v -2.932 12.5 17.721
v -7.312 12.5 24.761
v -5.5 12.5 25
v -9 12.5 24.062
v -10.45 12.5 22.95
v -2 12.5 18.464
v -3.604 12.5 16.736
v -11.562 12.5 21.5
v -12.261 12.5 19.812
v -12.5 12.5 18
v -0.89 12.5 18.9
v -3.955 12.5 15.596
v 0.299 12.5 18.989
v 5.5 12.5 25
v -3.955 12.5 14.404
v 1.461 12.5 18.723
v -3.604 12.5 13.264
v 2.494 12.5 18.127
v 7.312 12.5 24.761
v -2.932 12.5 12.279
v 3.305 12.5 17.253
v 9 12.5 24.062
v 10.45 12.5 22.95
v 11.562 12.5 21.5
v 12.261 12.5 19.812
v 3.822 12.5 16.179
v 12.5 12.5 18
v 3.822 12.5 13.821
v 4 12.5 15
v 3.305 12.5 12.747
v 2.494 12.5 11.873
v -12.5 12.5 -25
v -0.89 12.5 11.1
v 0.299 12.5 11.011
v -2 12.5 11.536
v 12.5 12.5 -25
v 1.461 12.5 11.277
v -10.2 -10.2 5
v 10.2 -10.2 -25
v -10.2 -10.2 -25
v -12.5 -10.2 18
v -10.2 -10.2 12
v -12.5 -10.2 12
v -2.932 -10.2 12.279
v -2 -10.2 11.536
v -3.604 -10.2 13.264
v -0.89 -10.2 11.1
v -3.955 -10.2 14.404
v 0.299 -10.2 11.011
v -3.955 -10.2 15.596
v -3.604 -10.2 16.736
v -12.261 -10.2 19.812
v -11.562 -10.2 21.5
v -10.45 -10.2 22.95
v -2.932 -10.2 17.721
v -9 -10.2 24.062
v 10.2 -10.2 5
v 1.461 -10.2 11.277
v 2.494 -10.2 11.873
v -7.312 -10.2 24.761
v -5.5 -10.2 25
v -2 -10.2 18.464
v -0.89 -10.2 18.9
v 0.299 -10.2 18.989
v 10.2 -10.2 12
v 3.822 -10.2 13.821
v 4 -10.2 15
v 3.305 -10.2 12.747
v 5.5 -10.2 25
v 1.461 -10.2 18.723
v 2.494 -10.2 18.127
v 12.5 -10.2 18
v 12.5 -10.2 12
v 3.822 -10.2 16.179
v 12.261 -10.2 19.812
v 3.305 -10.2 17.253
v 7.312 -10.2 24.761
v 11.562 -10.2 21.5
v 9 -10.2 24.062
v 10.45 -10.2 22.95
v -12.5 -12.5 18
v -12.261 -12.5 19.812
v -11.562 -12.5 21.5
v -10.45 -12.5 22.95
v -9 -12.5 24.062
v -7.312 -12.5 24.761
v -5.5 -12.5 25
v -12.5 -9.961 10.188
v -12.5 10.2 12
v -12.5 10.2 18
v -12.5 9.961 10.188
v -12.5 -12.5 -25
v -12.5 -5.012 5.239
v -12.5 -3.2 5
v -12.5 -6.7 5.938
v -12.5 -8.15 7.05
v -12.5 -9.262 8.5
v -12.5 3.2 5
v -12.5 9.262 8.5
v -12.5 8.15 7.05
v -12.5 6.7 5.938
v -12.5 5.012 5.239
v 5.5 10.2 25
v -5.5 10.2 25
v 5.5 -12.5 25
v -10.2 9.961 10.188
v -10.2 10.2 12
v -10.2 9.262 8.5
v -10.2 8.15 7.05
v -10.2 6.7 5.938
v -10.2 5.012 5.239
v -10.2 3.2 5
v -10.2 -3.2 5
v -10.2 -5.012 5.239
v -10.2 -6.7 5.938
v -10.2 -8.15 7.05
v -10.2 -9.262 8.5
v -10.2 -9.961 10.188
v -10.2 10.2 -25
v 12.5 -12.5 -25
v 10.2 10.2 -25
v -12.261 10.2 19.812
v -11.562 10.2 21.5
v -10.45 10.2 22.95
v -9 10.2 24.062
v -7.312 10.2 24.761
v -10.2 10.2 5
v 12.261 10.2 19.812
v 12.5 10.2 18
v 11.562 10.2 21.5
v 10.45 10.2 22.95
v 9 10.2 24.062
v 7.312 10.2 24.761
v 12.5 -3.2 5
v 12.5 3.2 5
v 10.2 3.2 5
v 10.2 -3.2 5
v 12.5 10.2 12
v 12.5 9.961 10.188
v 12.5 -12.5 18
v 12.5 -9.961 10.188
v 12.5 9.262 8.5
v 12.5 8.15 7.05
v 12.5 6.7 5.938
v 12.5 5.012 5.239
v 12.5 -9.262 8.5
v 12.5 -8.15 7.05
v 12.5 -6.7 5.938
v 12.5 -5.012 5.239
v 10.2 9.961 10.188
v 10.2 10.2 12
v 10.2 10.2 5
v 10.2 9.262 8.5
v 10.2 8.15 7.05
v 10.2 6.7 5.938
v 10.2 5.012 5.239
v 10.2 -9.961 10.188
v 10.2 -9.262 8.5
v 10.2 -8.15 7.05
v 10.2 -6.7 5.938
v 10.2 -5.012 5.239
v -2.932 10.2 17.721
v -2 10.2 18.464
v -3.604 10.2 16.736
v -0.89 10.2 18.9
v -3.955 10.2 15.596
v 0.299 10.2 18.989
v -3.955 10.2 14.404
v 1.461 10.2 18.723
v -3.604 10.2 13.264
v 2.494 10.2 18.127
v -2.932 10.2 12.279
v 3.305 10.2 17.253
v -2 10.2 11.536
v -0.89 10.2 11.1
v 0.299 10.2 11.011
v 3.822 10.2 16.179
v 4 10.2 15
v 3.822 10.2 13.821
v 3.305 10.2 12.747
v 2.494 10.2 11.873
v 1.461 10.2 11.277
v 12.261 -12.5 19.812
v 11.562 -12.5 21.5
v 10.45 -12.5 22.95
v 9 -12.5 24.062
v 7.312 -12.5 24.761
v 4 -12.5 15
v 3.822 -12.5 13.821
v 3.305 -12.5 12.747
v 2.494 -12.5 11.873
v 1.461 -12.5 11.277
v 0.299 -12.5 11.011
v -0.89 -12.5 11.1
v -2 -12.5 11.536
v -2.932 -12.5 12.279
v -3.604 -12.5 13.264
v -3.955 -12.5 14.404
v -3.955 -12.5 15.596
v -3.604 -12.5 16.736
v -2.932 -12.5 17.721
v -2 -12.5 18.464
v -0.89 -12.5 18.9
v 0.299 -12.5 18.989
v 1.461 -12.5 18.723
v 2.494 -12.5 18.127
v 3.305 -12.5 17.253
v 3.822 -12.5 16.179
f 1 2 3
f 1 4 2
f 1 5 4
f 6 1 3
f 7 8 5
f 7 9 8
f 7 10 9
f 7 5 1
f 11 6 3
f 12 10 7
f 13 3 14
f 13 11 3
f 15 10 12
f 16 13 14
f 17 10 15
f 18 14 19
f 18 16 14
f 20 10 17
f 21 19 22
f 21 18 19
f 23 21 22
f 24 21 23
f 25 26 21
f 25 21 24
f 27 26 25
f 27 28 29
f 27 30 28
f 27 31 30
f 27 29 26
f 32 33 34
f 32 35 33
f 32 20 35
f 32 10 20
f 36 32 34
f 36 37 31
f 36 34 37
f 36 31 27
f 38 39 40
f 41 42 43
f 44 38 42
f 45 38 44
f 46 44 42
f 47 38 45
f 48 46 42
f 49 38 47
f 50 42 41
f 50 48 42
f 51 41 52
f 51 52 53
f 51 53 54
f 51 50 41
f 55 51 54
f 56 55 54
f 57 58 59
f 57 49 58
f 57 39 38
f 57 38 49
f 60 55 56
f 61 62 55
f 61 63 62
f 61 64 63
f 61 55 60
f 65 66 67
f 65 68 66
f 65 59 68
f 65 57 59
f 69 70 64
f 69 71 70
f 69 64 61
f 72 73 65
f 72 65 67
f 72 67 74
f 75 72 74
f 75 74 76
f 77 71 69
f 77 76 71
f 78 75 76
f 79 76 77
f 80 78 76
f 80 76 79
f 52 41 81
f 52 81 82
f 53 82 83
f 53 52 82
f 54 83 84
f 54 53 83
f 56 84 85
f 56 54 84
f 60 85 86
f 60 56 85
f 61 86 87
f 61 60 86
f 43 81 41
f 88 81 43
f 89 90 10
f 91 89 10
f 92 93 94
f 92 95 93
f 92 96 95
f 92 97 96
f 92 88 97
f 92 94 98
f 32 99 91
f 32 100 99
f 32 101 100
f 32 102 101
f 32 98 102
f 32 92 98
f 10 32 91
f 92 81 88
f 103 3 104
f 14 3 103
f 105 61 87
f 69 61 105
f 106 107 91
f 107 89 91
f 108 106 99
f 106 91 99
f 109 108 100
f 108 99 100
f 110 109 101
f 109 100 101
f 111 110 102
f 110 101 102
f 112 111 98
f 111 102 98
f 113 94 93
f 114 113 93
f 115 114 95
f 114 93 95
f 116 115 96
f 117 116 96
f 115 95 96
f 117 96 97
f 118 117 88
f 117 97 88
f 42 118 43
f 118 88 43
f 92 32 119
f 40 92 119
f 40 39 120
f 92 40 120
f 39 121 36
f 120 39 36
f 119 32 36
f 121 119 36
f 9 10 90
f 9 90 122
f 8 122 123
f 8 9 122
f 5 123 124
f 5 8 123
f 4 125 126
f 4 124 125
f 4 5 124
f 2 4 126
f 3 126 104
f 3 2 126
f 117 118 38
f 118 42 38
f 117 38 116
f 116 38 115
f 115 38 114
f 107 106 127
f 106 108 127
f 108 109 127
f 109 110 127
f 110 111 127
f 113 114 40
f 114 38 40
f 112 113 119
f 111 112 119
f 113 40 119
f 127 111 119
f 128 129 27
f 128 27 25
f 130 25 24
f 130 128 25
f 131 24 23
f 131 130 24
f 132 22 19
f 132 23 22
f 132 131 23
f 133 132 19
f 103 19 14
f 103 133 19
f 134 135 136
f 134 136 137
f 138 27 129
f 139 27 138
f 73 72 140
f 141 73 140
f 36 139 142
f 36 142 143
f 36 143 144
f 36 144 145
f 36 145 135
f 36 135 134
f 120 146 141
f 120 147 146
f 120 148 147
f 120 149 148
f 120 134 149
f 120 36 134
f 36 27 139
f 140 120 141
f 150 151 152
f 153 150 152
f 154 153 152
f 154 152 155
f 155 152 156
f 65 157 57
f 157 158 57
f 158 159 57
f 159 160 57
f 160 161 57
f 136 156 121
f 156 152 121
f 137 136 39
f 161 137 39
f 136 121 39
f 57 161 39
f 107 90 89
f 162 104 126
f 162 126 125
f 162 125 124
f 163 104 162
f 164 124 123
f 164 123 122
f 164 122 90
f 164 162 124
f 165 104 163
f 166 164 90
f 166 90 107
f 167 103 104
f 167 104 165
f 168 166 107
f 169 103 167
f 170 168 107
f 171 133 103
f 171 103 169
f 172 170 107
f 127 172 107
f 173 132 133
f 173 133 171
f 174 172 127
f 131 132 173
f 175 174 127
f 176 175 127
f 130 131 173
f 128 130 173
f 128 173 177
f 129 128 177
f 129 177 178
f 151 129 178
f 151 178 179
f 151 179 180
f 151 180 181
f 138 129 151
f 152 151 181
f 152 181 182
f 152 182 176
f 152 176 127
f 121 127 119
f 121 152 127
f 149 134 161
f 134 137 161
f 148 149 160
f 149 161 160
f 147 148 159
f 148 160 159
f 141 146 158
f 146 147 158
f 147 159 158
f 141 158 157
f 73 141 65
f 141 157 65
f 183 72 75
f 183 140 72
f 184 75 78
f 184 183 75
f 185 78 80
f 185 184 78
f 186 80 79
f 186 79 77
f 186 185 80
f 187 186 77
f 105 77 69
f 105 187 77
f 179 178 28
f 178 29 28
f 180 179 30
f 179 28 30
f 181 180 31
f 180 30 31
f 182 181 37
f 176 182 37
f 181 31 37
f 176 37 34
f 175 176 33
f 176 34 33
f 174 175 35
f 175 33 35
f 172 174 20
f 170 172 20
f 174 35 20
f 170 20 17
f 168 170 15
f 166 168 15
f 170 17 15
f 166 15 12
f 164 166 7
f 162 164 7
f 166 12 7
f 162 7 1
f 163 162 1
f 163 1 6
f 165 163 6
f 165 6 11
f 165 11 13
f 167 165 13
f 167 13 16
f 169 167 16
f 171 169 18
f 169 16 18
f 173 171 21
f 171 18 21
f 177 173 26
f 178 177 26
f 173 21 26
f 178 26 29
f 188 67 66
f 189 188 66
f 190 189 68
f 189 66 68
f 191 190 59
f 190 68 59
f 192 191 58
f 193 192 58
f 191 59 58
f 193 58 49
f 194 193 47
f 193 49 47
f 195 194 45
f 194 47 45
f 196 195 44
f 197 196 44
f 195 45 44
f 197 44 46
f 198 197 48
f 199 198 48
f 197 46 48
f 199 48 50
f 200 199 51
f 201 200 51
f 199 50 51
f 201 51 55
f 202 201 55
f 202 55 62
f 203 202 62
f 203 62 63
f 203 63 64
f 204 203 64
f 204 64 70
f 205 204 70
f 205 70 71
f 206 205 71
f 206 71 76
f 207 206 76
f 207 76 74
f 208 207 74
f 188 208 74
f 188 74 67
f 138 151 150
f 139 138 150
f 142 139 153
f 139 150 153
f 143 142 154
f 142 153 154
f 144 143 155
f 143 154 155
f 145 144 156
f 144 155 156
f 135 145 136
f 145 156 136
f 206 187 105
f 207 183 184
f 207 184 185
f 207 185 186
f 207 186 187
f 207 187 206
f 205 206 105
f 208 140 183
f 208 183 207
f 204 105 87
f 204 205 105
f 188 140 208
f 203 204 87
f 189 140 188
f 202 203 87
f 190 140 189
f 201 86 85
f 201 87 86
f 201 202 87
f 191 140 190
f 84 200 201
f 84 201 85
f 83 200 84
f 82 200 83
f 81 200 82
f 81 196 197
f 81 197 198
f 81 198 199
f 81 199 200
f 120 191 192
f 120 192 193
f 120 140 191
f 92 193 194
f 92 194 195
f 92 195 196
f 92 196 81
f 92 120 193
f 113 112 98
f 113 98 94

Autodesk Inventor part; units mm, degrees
ref_plane "YZ Plane" through (0, 0, 0) normal (1, 0, 0) x (0, 1, 0)
ref_plane "XZ Plane" through (0, 0, 0) normal (0, 1, 0) x (-1, 0, 0)
ref_plane "XY Plane" through (0, 0, 0) normal (0, 0, 1) x (1, 0, 0)
sketch "スケッチ1" plane through (0, 0, 0) normal (0, 0, 1) x (1, 0, 0)
  line L0 (-12.5, 12.5) -> (12.5, 12.5)
  line L1 (12.5, 12.5) -> (12.5, -12.5)
  line L2 (12.5, -12.5) -> (-12.5, -12.5)
  line L3 (-12.5, -12.5) -> (-12.5, 12.5)
  line L4 (-12.5, 12.5) -> (12.5, -12.5) construction
  line L5 (12.5, 12.5) -> (-12.5, -12.5) construction
  point P0 (0, 0)
  dimension "d0" = 25
  dimension "d1" = 25
extrude "押し出し1" add sketch "スケッチ1" along normal mid plane 50
shell "シェル1" thickness 2.3 removed faces 2 at (-4.1667, -4.1667, 25) at (-4.1667, -4.1667, -25)
sketch "スケッチ2" plane through (12.5, -12.5, 25) normal (1, 0, 0) x (0, 0, -1)
  line L0 (0, 22.7) -> (20, 22.7)
  line L1 (20, 22.7) -> (20, 2.3)
  line L2 (20, 2.3) -> (0, 2.3)
  line L3 (0, 2.3) -> (0, 22.7)
  line L4 (0, 22.7) -> (20, 2.3) construction
  line L5 (20, 22.7) -> (0, 2.3) construction
  line L6 (0, 0) -> (0, 25) projected
  point P0 (25, 12.5)
  point P1 (10, 12.5)
  dimension "d5" = 20
extrude "押し出し2" cut sketch "スケッチ2" against normal through all
sketch "スケッチ3" plane through (-12.5, 12.5, 25) normal (0, 1, 0) x (1, 0, 0)
  circle A0 centre (12.5, 10) radius 4
  line L0 (25, 0) -> (0, 0) projected
  line L1 (0, 50) -> (0, 0) projected
  point P0 (12.5, 25)
  dimension "d8" = 8
  dimension "d9" = 10
  dimension "d10" = 12.5
extrude "押し出し3" cut sketch "スケッチ3" against normal through all
fillet "フィレット1" radius 7 8 edges at (12.5, -11.35, 25) (-12.5, -11.35, 25) (-12.5, 11.35, 25) (12.5, 11.35, 25) (11.35, 10.2, 5) (-11.35, 10.2, 5) (-11.35, -10.2, 5) (11.35, -10.2, 5)
equation "\"d1\" = d0"
properties part number "body-braket"
